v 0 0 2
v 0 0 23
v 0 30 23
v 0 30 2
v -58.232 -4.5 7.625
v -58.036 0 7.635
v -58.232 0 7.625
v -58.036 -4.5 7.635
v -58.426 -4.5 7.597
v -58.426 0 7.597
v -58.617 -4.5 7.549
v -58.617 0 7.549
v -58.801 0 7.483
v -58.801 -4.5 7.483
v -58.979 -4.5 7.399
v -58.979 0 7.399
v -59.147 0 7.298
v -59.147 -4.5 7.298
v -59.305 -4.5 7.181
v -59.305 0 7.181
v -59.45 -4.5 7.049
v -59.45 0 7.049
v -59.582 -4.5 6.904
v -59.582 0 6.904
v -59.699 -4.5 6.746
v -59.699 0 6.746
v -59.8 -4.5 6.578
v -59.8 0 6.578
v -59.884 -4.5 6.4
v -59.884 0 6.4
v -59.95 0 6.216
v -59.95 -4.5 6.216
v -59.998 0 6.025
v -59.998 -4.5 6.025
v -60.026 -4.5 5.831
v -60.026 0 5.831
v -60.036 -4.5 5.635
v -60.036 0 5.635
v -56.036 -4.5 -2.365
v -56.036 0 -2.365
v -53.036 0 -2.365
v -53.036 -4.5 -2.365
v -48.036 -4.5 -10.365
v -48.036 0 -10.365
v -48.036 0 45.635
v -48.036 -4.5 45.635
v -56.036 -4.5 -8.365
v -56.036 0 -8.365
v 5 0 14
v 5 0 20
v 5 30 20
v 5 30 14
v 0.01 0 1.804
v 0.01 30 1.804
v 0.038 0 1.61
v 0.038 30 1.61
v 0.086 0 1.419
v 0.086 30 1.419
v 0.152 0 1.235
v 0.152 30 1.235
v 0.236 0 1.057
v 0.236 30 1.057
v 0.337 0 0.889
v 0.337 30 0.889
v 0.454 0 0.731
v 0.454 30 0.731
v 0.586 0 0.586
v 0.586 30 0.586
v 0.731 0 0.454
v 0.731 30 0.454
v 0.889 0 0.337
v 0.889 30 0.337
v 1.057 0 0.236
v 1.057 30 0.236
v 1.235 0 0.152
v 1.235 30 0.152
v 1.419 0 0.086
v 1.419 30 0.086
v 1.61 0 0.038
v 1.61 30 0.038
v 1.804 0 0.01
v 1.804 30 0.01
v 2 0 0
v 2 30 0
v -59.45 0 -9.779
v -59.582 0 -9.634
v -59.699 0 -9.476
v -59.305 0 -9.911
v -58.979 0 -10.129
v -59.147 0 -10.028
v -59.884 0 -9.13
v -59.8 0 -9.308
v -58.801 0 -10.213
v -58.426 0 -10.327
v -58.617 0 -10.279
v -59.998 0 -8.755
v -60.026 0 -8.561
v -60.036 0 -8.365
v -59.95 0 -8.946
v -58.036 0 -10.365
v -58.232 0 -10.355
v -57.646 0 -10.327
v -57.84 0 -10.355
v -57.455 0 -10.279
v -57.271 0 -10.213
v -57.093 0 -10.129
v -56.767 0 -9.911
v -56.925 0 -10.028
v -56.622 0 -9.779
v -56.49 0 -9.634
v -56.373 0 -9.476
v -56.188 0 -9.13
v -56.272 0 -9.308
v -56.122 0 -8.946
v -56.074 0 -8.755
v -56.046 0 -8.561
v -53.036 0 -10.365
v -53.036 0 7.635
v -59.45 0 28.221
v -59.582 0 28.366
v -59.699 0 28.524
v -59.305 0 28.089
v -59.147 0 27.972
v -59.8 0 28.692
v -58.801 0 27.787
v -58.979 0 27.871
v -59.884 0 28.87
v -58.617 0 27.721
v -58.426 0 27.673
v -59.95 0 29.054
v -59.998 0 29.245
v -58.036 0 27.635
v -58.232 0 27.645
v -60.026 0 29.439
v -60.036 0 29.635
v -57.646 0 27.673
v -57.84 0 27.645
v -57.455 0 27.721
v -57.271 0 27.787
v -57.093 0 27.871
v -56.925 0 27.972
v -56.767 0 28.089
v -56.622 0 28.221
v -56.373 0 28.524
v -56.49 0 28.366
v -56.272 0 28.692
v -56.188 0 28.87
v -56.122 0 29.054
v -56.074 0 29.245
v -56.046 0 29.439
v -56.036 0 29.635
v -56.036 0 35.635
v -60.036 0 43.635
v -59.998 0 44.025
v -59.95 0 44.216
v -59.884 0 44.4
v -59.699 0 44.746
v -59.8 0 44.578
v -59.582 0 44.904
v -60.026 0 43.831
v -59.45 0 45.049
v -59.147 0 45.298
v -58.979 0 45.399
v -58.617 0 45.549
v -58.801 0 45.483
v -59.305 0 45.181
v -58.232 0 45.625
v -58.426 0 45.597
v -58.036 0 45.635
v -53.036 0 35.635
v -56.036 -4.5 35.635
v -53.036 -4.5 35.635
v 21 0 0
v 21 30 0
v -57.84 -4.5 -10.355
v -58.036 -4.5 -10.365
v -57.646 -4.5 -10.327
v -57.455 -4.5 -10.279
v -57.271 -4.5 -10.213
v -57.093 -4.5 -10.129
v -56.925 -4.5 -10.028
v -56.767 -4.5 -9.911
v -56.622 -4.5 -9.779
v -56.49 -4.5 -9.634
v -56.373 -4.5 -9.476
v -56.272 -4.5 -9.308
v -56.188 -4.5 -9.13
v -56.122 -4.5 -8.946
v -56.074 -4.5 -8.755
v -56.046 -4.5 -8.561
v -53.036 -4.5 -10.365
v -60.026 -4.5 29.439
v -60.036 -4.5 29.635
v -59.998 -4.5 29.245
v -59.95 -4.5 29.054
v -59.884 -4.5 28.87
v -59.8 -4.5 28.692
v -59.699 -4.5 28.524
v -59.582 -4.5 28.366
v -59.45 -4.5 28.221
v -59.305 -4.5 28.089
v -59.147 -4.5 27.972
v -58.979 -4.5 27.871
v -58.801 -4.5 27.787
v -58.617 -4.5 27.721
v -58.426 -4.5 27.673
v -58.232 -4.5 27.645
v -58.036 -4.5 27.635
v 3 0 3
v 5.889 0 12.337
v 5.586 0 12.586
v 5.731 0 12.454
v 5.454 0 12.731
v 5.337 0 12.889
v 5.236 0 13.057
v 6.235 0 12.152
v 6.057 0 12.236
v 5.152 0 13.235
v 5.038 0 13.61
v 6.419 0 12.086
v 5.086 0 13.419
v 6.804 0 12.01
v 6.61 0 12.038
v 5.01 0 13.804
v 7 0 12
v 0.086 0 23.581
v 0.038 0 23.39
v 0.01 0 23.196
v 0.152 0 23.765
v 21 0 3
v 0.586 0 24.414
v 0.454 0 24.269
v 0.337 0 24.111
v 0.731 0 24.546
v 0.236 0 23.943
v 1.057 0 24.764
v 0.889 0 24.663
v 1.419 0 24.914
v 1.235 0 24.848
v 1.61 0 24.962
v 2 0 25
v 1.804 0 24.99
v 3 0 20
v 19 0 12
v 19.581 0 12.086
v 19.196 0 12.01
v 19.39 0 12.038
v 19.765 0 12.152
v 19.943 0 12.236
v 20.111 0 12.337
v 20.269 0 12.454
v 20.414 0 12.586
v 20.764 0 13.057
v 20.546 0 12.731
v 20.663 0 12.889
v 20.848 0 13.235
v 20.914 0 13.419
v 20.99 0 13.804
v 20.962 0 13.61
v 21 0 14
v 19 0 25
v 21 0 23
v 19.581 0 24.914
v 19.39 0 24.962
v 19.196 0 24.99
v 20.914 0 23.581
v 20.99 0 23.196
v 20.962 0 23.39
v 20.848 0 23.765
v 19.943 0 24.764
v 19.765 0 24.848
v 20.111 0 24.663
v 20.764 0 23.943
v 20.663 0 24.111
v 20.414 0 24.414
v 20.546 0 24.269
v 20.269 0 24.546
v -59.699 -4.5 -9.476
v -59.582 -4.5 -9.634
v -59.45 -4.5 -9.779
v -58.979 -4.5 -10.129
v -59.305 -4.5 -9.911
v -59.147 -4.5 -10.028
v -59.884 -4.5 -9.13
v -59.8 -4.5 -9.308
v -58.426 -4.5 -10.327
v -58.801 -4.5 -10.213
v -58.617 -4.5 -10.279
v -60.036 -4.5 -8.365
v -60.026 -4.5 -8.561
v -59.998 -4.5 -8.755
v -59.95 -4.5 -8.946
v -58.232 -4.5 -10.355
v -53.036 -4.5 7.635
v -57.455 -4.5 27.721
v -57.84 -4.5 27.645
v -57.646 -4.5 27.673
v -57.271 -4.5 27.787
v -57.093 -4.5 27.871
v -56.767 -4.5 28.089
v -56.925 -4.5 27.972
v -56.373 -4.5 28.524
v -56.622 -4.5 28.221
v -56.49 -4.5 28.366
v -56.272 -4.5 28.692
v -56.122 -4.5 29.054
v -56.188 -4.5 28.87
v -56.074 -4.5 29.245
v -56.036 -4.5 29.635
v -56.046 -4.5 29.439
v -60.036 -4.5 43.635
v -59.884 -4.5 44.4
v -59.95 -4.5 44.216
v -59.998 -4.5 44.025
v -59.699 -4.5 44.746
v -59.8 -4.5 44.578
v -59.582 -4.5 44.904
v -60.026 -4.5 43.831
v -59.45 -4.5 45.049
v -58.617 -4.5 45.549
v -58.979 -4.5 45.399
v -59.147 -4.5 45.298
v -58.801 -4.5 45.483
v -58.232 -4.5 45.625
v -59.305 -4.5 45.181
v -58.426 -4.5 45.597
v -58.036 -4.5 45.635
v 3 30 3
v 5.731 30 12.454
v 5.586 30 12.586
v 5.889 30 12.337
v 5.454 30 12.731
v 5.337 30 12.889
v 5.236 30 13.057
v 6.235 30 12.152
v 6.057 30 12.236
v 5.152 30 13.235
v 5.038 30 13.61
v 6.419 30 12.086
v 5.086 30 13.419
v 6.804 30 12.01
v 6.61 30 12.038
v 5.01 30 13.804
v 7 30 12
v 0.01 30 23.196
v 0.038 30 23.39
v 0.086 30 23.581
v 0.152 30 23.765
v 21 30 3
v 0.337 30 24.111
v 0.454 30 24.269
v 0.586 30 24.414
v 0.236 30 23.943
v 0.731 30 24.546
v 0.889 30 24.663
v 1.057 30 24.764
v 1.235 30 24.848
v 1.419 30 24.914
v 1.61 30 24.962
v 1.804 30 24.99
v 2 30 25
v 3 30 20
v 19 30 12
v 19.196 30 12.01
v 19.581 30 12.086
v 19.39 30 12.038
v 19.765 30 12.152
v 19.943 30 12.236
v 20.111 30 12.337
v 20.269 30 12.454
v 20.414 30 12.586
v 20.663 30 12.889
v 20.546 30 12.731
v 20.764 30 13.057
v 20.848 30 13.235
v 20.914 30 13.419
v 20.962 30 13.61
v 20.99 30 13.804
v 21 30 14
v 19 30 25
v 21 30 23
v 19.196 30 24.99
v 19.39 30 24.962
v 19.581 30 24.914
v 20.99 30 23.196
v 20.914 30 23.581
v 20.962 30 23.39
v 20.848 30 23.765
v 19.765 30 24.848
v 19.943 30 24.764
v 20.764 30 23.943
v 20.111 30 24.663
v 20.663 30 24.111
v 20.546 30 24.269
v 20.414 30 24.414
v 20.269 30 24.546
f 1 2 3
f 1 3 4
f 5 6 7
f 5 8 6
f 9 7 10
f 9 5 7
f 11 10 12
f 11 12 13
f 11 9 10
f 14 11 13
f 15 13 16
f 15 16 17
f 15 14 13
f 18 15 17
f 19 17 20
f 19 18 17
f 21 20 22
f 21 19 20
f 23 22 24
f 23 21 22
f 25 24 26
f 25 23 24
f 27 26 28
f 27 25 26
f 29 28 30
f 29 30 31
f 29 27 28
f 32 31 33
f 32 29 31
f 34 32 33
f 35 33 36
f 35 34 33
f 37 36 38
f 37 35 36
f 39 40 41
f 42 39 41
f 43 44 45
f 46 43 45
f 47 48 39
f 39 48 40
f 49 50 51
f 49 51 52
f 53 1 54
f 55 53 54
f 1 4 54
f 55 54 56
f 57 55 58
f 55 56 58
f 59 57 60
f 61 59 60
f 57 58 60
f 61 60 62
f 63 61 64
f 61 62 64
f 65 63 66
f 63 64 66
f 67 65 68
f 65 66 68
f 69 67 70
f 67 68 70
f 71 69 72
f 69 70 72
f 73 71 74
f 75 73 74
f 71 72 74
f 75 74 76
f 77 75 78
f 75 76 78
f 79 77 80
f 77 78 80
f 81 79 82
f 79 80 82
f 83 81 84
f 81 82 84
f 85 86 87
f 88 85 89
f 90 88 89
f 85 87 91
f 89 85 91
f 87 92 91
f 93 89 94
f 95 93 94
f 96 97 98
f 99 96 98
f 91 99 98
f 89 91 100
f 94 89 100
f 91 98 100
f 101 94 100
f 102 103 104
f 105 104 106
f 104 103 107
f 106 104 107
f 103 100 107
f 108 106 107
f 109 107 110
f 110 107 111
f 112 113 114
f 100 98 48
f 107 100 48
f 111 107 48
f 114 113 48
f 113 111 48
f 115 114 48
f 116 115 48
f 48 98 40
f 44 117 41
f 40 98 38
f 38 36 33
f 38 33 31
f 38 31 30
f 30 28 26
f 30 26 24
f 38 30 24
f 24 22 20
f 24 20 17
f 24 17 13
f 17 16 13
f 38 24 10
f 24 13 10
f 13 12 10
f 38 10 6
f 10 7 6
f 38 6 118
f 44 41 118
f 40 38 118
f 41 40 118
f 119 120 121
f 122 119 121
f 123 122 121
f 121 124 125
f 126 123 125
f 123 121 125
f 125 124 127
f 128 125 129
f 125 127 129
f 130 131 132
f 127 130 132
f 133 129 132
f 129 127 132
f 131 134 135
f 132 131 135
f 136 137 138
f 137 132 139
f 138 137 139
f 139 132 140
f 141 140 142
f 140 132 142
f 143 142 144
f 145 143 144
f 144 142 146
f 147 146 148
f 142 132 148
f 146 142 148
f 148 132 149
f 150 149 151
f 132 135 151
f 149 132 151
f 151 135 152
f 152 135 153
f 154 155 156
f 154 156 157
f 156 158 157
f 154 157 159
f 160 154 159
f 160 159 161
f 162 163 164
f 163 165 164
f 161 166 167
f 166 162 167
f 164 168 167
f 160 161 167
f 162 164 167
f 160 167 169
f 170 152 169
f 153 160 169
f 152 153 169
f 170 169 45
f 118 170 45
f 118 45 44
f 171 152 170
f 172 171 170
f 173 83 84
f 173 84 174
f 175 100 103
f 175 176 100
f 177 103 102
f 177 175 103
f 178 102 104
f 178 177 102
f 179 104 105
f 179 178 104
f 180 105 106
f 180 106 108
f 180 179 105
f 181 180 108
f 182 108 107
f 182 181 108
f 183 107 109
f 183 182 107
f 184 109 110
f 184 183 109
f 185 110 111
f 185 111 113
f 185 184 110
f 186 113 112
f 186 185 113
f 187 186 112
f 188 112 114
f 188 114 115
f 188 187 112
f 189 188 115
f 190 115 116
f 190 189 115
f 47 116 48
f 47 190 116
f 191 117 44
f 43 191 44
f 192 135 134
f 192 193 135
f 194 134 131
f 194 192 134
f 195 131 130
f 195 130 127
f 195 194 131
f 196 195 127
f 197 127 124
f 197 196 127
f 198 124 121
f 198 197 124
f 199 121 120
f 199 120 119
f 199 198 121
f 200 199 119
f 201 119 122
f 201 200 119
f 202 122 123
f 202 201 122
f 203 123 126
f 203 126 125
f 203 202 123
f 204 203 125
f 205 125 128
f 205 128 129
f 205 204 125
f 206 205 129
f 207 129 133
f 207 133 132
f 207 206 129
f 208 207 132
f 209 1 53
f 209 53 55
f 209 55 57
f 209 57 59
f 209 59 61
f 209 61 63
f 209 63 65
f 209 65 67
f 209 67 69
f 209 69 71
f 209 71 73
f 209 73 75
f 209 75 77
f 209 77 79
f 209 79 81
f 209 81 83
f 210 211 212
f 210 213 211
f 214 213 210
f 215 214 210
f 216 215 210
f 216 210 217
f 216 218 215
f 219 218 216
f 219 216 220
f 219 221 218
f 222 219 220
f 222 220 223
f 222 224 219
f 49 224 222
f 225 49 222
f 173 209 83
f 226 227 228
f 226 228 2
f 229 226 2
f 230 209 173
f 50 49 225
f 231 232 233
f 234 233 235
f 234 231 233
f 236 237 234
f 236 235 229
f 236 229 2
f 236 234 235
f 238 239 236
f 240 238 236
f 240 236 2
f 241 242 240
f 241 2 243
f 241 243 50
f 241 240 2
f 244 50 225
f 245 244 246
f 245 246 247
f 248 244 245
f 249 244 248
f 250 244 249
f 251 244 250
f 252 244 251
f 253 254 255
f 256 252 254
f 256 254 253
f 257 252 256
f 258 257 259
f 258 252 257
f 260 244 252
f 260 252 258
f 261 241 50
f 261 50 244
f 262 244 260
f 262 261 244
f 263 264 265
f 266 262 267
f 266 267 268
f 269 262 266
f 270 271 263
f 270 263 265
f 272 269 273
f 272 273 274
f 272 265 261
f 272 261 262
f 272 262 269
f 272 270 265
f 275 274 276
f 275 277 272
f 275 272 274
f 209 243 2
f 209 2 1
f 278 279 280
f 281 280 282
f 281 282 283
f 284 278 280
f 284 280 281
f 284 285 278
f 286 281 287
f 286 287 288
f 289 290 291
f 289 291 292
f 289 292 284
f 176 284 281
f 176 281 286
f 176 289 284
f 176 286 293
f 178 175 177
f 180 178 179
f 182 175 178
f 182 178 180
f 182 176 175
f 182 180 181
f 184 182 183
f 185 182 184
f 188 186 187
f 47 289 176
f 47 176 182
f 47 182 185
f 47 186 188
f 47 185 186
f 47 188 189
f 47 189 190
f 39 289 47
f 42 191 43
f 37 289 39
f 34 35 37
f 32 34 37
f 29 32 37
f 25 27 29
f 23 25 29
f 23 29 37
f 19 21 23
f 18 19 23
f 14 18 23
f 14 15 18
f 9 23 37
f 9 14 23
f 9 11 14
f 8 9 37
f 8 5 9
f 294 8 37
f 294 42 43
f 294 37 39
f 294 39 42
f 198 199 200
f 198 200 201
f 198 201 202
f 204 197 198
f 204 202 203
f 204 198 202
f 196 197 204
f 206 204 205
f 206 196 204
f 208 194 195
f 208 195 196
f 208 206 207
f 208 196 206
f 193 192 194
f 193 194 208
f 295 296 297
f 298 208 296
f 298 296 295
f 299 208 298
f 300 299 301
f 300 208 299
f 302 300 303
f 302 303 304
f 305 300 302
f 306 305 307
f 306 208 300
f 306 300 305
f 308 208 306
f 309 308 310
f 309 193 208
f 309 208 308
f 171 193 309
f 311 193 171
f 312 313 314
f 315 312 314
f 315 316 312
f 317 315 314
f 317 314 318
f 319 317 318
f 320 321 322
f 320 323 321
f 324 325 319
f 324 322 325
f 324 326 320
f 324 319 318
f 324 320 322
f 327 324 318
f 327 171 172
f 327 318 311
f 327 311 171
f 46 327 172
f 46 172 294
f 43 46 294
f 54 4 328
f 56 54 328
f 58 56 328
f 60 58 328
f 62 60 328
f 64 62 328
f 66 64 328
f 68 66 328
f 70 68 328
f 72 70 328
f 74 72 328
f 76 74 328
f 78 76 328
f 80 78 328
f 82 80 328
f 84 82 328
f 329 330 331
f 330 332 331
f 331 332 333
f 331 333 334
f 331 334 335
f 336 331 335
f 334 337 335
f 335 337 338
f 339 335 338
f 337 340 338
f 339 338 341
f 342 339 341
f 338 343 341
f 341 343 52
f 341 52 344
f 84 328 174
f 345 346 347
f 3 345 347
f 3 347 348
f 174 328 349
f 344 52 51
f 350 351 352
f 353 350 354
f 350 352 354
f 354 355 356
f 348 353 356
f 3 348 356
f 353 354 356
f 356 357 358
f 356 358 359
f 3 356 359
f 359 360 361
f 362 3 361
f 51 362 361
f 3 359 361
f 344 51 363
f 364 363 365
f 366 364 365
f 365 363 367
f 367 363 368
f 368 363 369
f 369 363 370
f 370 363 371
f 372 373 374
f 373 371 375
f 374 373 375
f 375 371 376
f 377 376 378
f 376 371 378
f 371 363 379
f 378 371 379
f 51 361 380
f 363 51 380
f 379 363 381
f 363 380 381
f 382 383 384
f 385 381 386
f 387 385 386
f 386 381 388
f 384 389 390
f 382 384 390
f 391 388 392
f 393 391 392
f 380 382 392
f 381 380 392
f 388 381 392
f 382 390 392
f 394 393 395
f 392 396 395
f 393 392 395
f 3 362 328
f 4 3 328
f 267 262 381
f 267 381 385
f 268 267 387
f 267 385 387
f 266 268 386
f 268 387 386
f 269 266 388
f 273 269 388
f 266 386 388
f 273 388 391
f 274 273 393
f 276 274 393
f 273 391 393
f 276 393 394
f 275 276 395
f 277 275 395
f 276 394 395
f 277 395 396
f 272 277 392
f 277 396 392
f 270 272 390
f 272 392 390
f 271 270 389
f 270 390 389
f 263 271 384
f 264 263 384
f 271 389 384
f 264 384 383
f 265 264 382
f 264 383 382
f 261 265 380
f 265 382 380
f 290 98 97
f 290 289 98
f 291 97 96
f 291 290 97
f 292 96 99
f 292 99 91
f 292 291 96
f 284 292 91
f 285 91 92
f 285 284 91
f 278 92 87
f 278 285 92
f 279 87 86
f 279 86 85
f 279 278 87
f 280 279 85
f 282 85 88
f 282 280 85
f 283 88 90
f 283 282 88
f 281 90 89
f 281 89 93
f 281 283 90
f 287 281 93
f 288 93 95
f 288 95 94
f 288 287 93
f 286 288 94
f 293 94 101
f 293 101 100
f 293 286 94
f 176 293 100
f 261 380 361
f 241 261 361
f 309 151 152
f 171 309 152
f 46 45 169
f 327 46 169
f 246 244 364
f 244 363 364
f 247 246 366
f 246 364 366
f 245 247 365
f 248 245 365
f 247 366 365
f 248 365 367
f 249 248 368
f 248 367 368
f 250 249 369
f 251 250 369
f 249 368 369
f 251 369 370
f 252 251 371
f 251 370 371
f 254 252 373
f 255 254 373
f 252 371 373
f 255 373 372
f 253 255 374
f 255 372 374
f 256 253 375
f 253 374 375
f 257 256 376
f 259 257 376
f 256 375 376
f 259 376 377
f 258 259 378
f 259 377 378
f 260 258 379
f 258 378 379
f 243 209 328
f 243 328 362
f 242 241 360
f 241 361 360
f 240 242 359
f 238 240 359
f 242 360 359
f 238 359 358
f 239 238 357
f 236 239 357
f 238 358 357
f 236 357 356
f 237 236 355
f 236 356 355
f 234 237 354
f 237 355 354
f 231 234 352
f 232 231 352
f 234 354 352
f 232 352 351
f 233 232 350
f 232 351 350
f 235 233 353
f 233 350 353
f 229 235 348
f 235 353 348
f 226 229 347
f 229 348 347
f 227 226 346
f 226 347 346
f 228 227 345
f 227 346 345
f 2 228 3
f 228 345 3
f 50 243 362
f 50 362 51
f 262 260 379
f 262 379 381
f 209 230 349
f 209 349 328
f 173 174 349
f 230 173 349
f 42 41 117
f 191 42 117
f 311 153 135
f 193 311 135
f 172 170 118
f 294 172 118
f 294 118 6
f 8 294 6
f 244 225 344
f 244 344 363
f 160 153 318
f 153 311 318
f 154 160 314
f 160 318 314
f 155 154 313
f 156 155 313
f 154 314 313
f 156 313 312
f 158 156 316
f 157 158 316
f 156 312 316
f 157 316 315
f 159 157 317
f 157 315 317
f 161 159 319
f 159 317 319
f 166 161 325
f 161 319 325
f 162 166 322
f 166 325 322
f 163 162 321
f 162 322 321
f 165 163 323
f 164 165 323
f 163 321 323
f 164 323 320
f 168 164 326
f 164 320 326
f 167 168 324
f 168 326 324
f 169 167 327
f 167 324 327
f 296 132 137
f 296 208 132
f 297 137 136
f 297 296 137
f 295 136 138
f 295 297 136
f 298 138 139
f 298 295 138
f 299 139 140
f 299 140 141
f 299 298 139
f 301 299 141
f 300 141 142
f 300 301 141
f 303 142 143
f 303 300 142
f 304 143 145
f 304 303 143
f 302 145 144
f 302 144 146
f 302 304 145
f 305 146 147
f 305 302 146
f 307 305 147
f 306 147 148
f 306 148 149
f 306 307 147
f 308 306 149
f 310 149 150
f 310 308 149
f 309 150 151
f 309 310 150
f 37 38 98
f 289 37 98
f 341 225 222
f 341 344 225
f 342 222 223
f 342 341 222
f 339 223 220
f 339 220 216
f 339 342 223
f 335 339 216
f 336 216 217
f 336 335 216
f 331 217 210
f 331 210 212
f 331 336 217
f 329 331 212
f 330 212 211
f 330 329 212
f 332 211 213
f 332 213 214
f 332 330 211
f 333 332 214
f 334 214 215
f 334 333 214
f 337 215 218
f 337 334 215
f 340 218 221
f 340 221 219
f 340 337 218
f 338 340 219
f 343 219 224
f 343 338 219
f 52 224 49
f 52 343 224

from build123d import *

# Parameters (mm, degrees)
F1_DEPTH = 30
F2_R     = 2
F3_W     = 3
F3_H     = 10
F4_DEPTH = 4.5
F6_R     = 1.99999


# Not quite as in the source:
# - a fillet or chamfer is up to 0.001 mm smaller than in the source, because OpenCascade refuses the exact size


with BuildPart() as f1:
    # F0 (on Front) → F1 (new body)
    with BuildSketch(Plane.XZ):
        Polygon((5, 12), (21, 12), (21, 25), (0, 25), (0, 0), (21, 0), (21, 3), (3, 3), (3, 20), (5, 20), align=None)
    extrude(amount=-F1_DEPTH)

    # F2
    f2_edges = [f1.edges().sort_by_distance(p)[0] for p in [
        (21, 15, 25),
        (0, 15, 25),
        (21, 15, 12),
        (0, 15, 0),
        (5, 15, 12),
    ]]
    fillet(f2_edges, radius=F2_R)


with BuildPart() as f4:
    # F3 (on Front) → F4 (new body)
    with BuildSketch(Plane.XZ):
        Polygon((-56.0359997153, 45.6349952309), (-60.0359997153, 45.6349952309), (-60.0359997153, 27.6349952309), (-56.0359997153, 27.6349952309), (-56.0359997153, 35.6349952309), align=None)
        with Locations((-54.5359997153, 40.6349952309)):
            Rectangle(F3_W, F3_H)
        Polygon((-48.0359997153, 45.6349952309), (-53.0359997153, 45.6349952309), (-53.0359997153, 35.6349952309), (-53.0359997153, 7.6349952309), (-53.0359997153, -2.3650047691), (-53.0359997153, -10.3650047691), (-48.0359997153, -10.3650047691), align=None)
        with Locations((-54.5359997153, 2.6349952309)):
            Rectangle(F3_W, F3_H)
        Polygon((-56.0359997153, -2.3650047691), (-56.0359997153, 7.6349952309), (-60.0359997153, 7.6349952309), (-60.0359997153, -10.3650047691), (-56.0359997153, -10.3650047691), align=None)
    extrude(amount=F4_DEPTH)

    # F6 (radius 2 in the source; OpenCascade refuses exactly that, so slightly less here)
    f6_edges = [f4.edges().sort_by_distance(p)[0] for p in [
        (-56.036, -2.25, -10.365005),
        (-60.036, -2.25, -10.365005),
        (-60.036, -2.25, 7.634995),
        (-60.036, -2.25, 27.634995),
        (-56.036, -2.25, 27.634995),
        (-60.036, -2.25, 45.634995),
    ]]
    fillet(f6_edges, radius=F6_R)


solid = Compound([f1.part, f4.part])
